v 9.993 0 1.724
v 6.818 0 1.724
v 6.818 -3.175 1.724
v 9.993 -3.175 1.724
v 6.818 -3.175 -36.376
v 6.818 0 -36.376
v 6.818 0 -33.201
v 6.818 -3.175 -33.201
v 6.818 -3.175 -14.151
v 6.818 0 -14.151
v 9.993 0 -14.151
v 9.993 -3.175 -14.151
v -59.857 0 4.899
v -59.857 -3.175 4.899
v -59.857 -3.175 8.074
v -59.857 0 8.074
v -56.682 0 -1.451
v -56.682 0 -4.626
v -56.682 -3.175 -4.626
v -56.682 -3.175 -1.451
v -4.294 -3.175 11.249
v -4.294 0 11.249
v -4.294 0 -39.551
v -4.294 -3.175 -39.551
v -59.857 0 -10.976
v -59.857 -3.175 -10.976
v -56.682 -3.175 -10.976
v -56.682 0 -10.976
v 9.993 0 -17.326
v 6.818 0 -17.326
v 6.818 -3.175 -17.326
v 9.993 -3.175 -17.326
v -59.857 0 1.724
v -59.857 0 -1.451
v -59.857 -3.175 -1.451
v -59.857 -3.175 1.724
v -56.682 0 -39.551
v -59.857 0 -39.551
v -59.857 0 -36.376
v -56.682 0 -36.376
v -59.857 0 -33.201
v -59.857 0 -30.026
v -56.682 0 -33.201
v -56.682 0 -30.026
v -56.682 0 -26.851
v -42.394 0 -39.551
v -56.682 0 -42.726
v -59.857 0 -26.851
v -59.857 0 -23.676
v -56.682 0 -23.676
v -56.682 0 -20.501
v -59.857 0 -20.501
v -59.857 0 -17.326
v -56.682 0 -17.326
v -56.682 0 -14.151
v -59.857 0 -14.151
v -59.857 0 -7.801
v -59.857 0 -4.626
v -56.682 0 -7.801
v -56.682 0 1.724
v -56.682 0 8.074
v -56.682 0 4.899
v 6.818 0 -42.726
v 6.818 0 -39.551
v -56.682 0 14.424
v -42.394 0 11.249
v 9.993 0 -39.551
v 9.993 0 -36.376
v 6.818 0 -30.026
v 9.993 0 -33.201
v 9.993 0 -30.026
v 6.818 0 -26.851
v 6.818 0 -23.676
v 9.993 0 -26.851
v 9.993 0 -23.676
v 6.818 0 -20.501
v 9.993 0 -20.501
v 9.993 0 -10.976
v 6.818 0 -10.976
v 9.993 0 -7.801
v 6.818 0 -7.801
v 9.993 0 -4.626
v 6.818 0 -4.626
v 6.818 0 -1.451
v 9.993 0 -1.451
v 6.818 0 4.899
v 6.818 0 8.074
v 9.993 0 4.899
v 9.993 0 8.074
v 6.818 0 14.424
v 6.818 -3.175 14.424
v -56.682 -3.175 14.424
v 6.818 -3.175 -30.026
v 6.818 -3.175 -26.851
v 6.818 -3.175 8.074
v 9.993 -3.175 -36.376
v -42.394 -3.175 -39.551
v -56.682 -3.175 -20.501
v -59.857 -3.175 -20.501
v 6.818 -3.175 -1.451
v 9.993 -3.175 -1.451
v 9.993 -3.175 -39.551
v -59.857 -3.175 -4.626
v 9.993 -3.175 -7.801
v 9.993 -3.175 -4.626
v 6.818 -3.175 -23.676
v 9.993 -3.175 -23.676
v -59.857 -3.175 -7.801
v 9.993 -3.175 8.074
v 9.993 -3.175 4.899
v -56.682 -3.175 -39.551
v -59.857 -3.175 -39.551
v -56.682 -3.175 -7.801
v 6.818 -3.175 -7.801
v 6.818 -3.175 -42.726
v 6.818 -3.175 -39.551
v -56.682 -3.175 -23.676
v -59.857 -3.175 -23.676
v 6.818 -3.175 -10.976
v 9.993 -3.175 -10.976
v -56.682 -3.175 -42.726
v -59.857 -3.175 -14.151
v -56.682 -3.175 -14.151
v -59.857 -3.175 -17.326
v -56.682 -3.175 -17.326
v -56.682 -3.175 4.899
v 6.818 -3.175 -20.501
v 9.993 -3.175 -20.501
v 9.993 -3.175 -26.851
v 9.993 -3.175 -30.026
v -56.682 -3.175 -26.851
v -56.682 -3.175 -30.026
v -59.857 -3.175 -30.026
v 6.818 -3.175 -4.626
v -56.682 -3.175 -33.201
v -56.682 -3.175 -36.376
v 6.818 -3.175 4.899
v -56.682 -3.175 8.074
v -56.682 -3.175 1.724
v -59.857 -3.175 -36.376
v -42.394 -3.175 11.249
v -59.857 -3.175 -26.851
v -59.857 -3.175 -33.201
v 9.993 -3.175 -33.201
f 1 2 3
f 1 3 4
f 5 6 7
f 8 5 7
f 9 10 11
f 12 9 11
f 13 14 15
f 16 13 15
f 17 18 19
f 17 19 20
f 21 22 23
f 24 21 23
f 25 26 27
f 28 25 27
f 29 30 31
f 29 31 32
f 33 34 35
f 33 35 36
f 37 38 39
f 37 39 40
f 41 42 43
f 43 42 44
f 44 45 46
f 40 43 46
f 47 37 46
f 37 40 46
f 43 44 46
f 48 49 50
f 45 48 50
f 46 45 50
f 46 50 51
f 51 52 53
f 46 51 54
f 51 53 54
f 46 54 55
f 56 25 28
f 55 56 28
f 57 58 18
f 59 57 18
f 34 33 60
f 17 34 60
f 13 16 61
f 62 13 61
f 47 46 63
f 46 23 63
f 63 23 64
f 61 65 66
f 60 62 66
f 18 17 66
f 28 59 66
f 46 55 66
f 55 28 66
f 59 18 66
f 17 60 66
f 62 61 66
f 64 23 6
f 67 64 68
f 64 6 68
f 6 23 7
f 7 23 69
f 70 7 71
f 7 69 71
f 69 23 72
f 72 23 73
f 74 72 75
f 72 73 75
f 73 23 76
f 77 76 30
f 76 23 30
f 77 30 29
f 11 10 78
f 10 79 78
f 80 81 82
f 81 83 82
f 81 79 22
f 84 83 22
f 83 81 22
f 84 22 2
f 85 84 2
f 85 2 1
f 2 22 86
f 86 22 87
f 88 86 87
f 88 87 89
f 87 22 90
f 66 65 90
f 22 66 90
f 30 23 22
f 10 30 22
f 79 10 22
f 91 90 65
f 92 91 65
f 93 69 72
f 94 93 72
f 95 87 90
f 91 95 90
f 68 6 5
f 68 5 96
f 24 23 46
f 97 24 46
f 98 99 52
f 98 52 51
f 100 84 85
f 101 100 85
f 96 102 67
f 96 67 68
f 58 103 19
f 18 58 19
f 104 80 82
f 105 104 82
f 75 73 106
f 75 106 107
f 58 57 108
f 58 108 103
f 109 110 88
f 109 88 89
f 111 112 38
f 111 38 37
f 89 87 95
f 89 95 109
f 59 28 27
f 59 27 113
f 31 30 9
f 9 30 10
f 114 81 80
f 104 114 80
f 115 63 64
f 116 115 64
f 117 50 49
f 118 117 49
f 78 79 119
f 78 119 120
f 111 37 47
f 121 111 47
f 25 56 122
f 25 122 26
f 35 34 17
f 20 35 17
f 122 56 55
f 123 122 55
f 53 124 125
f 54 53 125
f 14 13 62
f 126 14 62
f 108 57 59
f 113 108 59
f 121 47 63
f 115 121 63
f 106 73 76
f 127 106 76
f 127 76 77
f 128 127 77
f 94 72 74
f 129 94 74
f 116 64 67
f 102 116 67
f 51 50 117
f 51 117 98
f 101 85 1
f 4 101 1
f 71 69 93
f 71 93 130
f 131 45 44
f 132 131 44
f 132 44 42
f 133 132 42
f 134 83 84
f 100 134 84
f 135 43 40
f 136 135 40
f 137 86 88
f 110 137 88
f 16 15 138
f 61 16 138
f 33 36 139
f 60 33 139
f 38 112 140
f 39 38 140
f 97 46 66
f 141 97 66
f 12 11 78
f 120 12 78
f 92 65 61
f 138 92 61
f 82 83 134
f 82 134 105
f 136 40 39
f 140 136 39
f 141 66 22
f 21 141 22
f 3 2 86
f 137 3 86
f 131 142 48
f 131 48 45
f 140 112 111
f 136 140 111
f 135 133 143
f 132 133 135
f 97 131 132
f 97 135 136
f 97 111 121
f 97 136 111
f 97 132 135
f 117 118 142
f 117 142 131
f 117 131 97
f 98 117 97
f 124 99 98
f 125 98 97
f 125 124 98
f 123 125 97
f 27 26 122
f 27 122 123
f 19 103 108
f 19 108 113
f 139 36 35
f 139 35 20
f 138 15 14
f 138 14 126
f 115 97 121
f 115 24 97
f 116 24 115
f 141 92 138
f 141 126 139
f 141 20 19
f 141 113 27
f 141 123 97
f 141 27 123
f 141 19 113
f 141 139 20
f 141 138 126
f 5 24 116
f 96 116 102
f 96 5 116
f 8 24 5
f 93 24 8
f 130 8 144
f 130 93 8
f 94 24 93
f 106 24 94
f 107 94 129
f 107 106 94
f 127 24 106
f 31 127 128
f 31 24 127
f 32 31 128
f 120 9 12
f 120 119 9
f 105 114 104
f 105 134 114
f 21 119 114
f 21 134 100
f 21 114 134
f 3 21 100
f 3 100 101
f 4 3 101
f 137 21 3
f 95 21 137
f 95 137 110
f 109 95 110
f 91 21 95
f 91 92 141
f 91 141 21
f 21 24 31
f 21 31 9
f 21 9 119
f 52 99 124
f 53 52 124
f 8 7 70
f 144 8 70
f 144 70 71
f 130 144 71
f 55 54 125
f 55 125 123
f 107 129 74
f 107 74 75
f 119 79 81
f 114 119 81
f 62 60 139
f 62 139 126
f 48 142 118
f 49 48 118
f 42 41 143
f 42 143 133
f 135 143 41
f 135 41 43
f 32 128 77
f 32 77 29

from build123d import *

# Parameters (mm, degrees)
F0_W     = 3.175
F0_H     = 3.175
F1_DEPTH = 3.175


# Not quite as in the source:
# - a feature names something its author has since deleted; it is built from what else it names


with BuildPart() as f1:
    # F0 (on Front) → F1 (new body)
    with BuildSketch(Plane.XZ):
        Polygon((-56.6817452915, 14.4236114298), (-56.6817452915, 11.2486114298), (-53.5067452915, 11.2486114298), (-42.3942452915, 11.2486114298), (-23.3442452915, 11.2486114298), (-4.2942452915, 11.2486114298), (6.8182547085, 11.2486114298), (6.8182547085, 14.4236114298), align=None)
        with Locations((-55.0942452915, 9.6611114298)):
            Rectangle(F0_W, F0_H)
        with Locations((-58.2692452915, 6.4861114298)):
            Rectangle(F0_W, F0_H)
        Polygon((-42.3942452915, 11.2486114298), (-53.5067452915, 11.2486114298), (-53.5067452915, 8.0736114298), (-53.5067452915, 4.8986114298), (-53.5067452915, 1.7236114298), (-53.5067452915, -1.4513885702), (-53.5067452915, -4.6263885702), (-53.5067452915, -7.8013885702), (-53.5067452915, -10.9763885702), (-53.5067452915, -14.1513885702), (-53.5067452915, -17.3263885702), (-53.5067452915, -20.5013885702), (-53.5067452915, -23.6763885702), (-53.5067452915, -26.8513885702), (-53.5067452915, -30.0263885702), (-53.5067452915, -33.2013885702), (-53.5067452915, -36.3763885702), (-53.5067452915, -39.5513885702), (-42.3942452915, -39.5513885702), align=None)
        with Locations((-55.0942452915, 6.4861114298)):
            Rectangle(F0_W, F0_H)
        with Locations((-55.0942452915, 3.3111114298)):
            Rectangle(F0_W, F0_H)
        with Locations((-58.2692452915, 0.1361114298)):
            Rectangle(F0_W, F0_H)
        Polygon((-23.3442452915, -39.5513885702), (-42.3942452915, -39.5513885702), (-53.5067452915, -39.5513885702), (-53.5067452915, -42.7263885702), (6.8182547085, -42.7263885702), (6.8182547085, -39.5513885702), (-4.2942452915, -39.5513885702), align=None)
        Polygon((6.8182547085, 8.0736114298), (6.8182547085, 11.2486114298), (-4.2942452915, 11.2486114298), (-4.2942452915, -39.5513885702), (6.8182547085, -39.5513885702), (6.8182547085, -36.3763885702), (6.8182547085, -33.2013885702), (6.8182547085, -30.0263885702), (6.8182547085, -26.8513885702), (6.8182547085, -23.6763885702), (6.8182547085, -20.5013885702), (6.8182547085, -17.3263885702), (6.8182547085, -14.1513885702), (6.8182547085, -10.9763885702), (6.8182547085, -7.8013885702), (6.8182547085, -4.6263885702), (6.8182547085, -1.4513885702), (6.8182547085, 1.7236114298), (6.8182547085, 4.8986114298), align=None)
        with Locations((-55.0942452915, 0.1361114298)):
            Rectangle(F0_W, F0_H)
        with Locations((-55.0942452915, -41.1388885702)):
            Rectangle(F0_W, F0_H)
        with Locations((-55.0942452915, -37.9638885702)):
            Rectangle(F0_W, F0_H)
        with Locations((8.4057547085, 6.4861114298)):
            Rectangle(F0_W, F0_H)
        with Locations((-55.0942452915, -3.0388885702)):
            Rectangle(F0_W, F0_H)
        with Locations((-58.2692452915, -6.2138885702)):
            Rectangle(F0_W, F0_H)
        with Locations((-58.2692452915, -37.9638885702)):
            Rectangle(F0_W, F0_H)
        with Locations((-55.0942452915, -34.7888885702)):
            Rectangle(F0_W, F0_H)
        with Locations((-55.0942452915, -6.2138885702)):
            Rectangle(F0_W, F0_H)
        with Locations((8.4057547085, -37.9638885702)):
            Rectangle(F0_W, F0_H)
        with Locations((-55.0942452915, -31.6138885702)):
            Rectangle(F0_W, F0_H)
        with Locations((8.4057547085, 0.1361114298)):
            Rectangle(F0_W, F0_H)
        with Locations((-55.0942452915, -9.3888885702)):
            Rectangle(F0_W, F0_H)
        with Locations((-58.2692452915, -12.5638885702)):
            Rectangle(F0_W, F0_H)
        with Locations((-58.2692452915, -31.6138885702)):
            Rectangle(F0_W, F0_H)
        with Locations((-55.0942452915, -28.4388885702)):
            Rectangle(F0_W, F0_H)
        with Locations((-55.0942452915, -12.5638885702)):
            Rectangle(F0_W, F0_H)
        with Locations((8.4057547085, -31.6138885702)):
            Rectangle(F0_W, F0_H)
        with Locations((-55.0942452915, -25.2638885702)):
            Rectangle(F0_W, F0_H)
        with Locations((8.4057547085, -6.2138885702)):
            Rectangle(F0_W, F0_H)
        with Locations((-55.0942452915, -15.7388885702)):
            Rectangle(F0_W, F0_H)
        with Locations((-58.2692452915, -18.9138885702)):
            Rectangle(F0_W, F0_H)
        with Locations((-58.2692452915, -25.2638885702)):
            Rectangle(F0_W, F0_H)
        with Locations((-55.0942452915, -22.0888885702)):
            Rectangle(F0_W, F0_H)
        with Locations((-55.0942452915, -18.9138885702)):
            Rectangle(F0_W, F0_H)
        with Locations((8.4057547085, -25.2638885702)):
            Rectangle(F0_W, F0_H)
        with Locations((8.4057547085, -12.5638885702)):
            Rectangle(F0_W, F0_H)
        with Locations((8.4057547085, -18.9138885702)):
            Rectangle(F0_W, F0_H)
    extrude(amount=F1_DEPTH)


solid = f1.part
